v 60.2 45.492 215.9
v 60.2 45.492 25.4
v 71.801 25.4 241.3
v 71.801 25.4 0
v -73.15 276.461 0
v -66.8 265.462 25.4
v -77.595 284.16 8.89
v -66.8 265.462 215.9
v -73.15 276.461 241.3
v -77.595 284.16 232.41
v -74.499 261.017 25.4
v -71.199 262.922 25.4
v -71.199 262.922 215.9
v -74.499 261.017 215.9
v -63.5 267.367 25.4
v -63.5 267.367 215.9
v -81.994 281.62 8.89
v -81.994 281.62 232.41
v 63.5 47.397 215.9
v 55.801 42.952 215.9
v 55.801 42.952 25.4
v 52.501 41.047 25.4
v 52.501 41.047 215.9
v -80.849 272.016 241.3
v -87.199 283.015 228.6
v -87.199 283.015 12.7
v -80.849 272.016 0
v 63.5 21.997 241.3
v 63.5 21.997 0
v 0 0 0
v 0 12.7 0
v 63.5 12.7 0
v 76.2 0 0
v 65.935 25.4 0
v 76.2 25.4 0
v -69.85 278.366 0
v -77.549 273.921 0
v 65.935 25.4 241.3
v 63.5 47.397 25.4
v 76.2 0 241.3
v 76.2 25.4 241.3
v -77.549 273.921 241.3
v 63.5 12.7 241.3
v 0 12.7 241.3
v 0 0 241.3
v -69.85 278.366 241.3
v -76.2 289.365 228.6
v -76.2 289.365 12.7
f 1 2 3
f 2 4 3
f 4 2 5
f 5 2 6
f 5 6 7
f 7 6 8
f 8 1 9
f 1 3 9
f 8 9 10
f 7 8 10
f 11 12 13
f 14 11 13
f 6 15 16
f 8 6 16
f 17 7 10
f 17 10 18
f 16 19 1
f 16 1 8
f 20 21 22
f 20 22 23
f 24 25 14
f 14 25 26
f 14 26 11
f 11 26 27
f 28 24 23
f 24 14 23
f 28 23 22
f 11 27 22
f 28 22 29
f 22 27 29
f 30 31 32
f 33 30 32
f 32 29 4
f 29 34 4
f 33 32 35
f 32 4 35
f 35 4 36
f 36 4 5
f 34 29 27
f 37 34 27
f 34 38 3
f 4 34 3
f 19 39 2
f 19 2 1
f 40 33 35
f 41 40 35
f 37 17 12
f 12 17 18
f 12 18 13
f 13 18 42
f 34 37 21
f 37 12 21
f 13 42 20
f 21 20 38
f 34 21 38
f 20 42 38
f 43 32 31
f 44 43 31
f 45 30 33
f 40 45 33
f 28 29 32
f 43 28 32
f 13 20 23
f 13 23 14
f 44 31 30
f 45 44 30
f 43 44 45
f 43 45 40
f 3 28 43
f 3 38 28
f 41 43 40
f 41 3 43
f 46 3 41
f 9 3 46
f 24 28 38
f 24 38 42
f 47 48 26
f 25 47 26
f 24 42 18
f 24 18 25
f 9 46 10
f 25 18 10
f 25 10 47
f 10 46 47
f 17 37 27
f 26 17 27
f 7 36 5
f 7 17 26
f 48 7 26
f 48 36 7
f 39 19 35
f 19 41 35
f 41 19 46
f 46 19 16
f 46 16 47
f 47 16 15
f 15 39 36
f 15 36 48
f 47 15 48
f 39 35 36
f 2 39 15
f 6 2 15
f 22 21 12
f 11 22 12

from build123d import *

# Parameters (mm, degrees)
F1_DEPTH    = 241.3
F2_W        = 254
F2_H        = 190.5
F3_DEPTH    = 25.4
F5_DEPTH    = 508
F6_T1_DEPTH = 78.0207478943
F7_T1_DEPTH = 78.0207478943


# Not quite as in the source:
# - a fillet or chamfer that OpenCascade refuses, or shapes differently, is made with other operations: its cross-section is extruded or revolved along the edge and cut away or added


with BuildPart() as f1:
    # F0 (on Top) → F1 (new body)
    with BuildSketch(Plane.XY):
        Polygon((0, 12.7), (0, 0), (76.2, 0), (76.2, 25.4), (-76.2, 289.3645430735), (-87.1985226281, 283.0145430735), (63.5, 21.9970452561), (63.5, 12.7), align=None)
    extrude(amount=F1_DEPTH)

    # F2 (on face) → F3 (cut)
    with BuildSketch(Plane(origin=(68.1485226281, 39.3455678842, 0), x_dir=(-0.5, 0.8660254038, 0), z_dir=(0.8660254038, 0.5, 0))):
        with Locations((136.2970452561, 120.65)):
            Rectangle(F2_W, F2_H)
    extrude(amount=-F3_DEPTH, mode=Mode.SUBTRACT)

    # F4 (on face) → F5 (cut)
    with BuildSketch(Plane.XY.offset(241.3)):
        Polygon((-81.9939685629, 281.6199870148), (65.9347099118, 25.4), (71.8005932508, 25.4), (-77.5945560587, 284.1599890084), align=None)
    extrude(amount=-F5_DEPTH, mode=Mode.SUBTRACT)

    # F6: chamfer of 12.7 on 1 edges, made by hand

    # F6_s2 → F6_t1 (cut)
    with BuildSketch(Plane(origin=(96.4332361634, 55.6757548578, 0), x_dir=(0, 0, 1), z_dir=(-0.8660254038, -0.5, 0))):
        Polygon((0, 275.9970452561), (12.7, 288.6970452561), (0, 288.6970452561), align=None)
    extrude(amount=F6_T1_DEPTH, mode=Mode.SUBTRACT)

    # F7: chamfer of 12.7 on 1 edges, made by hand

    # F7_s2 → F7_t1 (cut)
    with BuildSketch(Plane(origin=(96.4332361634, 55.6757548578, 0), x_dir=(0, 0, 1), z_dir=(-0.8660254038, -0.5, 0))):
        Polygon((241.3, 275.9970452561), (228.6, 288.6970452561), (241.3, 288.6970452561), align=None)
    extrude(amount=F7_T1_DEPTH, mode=Mode.SUBTRACT)


solid = f1.part
